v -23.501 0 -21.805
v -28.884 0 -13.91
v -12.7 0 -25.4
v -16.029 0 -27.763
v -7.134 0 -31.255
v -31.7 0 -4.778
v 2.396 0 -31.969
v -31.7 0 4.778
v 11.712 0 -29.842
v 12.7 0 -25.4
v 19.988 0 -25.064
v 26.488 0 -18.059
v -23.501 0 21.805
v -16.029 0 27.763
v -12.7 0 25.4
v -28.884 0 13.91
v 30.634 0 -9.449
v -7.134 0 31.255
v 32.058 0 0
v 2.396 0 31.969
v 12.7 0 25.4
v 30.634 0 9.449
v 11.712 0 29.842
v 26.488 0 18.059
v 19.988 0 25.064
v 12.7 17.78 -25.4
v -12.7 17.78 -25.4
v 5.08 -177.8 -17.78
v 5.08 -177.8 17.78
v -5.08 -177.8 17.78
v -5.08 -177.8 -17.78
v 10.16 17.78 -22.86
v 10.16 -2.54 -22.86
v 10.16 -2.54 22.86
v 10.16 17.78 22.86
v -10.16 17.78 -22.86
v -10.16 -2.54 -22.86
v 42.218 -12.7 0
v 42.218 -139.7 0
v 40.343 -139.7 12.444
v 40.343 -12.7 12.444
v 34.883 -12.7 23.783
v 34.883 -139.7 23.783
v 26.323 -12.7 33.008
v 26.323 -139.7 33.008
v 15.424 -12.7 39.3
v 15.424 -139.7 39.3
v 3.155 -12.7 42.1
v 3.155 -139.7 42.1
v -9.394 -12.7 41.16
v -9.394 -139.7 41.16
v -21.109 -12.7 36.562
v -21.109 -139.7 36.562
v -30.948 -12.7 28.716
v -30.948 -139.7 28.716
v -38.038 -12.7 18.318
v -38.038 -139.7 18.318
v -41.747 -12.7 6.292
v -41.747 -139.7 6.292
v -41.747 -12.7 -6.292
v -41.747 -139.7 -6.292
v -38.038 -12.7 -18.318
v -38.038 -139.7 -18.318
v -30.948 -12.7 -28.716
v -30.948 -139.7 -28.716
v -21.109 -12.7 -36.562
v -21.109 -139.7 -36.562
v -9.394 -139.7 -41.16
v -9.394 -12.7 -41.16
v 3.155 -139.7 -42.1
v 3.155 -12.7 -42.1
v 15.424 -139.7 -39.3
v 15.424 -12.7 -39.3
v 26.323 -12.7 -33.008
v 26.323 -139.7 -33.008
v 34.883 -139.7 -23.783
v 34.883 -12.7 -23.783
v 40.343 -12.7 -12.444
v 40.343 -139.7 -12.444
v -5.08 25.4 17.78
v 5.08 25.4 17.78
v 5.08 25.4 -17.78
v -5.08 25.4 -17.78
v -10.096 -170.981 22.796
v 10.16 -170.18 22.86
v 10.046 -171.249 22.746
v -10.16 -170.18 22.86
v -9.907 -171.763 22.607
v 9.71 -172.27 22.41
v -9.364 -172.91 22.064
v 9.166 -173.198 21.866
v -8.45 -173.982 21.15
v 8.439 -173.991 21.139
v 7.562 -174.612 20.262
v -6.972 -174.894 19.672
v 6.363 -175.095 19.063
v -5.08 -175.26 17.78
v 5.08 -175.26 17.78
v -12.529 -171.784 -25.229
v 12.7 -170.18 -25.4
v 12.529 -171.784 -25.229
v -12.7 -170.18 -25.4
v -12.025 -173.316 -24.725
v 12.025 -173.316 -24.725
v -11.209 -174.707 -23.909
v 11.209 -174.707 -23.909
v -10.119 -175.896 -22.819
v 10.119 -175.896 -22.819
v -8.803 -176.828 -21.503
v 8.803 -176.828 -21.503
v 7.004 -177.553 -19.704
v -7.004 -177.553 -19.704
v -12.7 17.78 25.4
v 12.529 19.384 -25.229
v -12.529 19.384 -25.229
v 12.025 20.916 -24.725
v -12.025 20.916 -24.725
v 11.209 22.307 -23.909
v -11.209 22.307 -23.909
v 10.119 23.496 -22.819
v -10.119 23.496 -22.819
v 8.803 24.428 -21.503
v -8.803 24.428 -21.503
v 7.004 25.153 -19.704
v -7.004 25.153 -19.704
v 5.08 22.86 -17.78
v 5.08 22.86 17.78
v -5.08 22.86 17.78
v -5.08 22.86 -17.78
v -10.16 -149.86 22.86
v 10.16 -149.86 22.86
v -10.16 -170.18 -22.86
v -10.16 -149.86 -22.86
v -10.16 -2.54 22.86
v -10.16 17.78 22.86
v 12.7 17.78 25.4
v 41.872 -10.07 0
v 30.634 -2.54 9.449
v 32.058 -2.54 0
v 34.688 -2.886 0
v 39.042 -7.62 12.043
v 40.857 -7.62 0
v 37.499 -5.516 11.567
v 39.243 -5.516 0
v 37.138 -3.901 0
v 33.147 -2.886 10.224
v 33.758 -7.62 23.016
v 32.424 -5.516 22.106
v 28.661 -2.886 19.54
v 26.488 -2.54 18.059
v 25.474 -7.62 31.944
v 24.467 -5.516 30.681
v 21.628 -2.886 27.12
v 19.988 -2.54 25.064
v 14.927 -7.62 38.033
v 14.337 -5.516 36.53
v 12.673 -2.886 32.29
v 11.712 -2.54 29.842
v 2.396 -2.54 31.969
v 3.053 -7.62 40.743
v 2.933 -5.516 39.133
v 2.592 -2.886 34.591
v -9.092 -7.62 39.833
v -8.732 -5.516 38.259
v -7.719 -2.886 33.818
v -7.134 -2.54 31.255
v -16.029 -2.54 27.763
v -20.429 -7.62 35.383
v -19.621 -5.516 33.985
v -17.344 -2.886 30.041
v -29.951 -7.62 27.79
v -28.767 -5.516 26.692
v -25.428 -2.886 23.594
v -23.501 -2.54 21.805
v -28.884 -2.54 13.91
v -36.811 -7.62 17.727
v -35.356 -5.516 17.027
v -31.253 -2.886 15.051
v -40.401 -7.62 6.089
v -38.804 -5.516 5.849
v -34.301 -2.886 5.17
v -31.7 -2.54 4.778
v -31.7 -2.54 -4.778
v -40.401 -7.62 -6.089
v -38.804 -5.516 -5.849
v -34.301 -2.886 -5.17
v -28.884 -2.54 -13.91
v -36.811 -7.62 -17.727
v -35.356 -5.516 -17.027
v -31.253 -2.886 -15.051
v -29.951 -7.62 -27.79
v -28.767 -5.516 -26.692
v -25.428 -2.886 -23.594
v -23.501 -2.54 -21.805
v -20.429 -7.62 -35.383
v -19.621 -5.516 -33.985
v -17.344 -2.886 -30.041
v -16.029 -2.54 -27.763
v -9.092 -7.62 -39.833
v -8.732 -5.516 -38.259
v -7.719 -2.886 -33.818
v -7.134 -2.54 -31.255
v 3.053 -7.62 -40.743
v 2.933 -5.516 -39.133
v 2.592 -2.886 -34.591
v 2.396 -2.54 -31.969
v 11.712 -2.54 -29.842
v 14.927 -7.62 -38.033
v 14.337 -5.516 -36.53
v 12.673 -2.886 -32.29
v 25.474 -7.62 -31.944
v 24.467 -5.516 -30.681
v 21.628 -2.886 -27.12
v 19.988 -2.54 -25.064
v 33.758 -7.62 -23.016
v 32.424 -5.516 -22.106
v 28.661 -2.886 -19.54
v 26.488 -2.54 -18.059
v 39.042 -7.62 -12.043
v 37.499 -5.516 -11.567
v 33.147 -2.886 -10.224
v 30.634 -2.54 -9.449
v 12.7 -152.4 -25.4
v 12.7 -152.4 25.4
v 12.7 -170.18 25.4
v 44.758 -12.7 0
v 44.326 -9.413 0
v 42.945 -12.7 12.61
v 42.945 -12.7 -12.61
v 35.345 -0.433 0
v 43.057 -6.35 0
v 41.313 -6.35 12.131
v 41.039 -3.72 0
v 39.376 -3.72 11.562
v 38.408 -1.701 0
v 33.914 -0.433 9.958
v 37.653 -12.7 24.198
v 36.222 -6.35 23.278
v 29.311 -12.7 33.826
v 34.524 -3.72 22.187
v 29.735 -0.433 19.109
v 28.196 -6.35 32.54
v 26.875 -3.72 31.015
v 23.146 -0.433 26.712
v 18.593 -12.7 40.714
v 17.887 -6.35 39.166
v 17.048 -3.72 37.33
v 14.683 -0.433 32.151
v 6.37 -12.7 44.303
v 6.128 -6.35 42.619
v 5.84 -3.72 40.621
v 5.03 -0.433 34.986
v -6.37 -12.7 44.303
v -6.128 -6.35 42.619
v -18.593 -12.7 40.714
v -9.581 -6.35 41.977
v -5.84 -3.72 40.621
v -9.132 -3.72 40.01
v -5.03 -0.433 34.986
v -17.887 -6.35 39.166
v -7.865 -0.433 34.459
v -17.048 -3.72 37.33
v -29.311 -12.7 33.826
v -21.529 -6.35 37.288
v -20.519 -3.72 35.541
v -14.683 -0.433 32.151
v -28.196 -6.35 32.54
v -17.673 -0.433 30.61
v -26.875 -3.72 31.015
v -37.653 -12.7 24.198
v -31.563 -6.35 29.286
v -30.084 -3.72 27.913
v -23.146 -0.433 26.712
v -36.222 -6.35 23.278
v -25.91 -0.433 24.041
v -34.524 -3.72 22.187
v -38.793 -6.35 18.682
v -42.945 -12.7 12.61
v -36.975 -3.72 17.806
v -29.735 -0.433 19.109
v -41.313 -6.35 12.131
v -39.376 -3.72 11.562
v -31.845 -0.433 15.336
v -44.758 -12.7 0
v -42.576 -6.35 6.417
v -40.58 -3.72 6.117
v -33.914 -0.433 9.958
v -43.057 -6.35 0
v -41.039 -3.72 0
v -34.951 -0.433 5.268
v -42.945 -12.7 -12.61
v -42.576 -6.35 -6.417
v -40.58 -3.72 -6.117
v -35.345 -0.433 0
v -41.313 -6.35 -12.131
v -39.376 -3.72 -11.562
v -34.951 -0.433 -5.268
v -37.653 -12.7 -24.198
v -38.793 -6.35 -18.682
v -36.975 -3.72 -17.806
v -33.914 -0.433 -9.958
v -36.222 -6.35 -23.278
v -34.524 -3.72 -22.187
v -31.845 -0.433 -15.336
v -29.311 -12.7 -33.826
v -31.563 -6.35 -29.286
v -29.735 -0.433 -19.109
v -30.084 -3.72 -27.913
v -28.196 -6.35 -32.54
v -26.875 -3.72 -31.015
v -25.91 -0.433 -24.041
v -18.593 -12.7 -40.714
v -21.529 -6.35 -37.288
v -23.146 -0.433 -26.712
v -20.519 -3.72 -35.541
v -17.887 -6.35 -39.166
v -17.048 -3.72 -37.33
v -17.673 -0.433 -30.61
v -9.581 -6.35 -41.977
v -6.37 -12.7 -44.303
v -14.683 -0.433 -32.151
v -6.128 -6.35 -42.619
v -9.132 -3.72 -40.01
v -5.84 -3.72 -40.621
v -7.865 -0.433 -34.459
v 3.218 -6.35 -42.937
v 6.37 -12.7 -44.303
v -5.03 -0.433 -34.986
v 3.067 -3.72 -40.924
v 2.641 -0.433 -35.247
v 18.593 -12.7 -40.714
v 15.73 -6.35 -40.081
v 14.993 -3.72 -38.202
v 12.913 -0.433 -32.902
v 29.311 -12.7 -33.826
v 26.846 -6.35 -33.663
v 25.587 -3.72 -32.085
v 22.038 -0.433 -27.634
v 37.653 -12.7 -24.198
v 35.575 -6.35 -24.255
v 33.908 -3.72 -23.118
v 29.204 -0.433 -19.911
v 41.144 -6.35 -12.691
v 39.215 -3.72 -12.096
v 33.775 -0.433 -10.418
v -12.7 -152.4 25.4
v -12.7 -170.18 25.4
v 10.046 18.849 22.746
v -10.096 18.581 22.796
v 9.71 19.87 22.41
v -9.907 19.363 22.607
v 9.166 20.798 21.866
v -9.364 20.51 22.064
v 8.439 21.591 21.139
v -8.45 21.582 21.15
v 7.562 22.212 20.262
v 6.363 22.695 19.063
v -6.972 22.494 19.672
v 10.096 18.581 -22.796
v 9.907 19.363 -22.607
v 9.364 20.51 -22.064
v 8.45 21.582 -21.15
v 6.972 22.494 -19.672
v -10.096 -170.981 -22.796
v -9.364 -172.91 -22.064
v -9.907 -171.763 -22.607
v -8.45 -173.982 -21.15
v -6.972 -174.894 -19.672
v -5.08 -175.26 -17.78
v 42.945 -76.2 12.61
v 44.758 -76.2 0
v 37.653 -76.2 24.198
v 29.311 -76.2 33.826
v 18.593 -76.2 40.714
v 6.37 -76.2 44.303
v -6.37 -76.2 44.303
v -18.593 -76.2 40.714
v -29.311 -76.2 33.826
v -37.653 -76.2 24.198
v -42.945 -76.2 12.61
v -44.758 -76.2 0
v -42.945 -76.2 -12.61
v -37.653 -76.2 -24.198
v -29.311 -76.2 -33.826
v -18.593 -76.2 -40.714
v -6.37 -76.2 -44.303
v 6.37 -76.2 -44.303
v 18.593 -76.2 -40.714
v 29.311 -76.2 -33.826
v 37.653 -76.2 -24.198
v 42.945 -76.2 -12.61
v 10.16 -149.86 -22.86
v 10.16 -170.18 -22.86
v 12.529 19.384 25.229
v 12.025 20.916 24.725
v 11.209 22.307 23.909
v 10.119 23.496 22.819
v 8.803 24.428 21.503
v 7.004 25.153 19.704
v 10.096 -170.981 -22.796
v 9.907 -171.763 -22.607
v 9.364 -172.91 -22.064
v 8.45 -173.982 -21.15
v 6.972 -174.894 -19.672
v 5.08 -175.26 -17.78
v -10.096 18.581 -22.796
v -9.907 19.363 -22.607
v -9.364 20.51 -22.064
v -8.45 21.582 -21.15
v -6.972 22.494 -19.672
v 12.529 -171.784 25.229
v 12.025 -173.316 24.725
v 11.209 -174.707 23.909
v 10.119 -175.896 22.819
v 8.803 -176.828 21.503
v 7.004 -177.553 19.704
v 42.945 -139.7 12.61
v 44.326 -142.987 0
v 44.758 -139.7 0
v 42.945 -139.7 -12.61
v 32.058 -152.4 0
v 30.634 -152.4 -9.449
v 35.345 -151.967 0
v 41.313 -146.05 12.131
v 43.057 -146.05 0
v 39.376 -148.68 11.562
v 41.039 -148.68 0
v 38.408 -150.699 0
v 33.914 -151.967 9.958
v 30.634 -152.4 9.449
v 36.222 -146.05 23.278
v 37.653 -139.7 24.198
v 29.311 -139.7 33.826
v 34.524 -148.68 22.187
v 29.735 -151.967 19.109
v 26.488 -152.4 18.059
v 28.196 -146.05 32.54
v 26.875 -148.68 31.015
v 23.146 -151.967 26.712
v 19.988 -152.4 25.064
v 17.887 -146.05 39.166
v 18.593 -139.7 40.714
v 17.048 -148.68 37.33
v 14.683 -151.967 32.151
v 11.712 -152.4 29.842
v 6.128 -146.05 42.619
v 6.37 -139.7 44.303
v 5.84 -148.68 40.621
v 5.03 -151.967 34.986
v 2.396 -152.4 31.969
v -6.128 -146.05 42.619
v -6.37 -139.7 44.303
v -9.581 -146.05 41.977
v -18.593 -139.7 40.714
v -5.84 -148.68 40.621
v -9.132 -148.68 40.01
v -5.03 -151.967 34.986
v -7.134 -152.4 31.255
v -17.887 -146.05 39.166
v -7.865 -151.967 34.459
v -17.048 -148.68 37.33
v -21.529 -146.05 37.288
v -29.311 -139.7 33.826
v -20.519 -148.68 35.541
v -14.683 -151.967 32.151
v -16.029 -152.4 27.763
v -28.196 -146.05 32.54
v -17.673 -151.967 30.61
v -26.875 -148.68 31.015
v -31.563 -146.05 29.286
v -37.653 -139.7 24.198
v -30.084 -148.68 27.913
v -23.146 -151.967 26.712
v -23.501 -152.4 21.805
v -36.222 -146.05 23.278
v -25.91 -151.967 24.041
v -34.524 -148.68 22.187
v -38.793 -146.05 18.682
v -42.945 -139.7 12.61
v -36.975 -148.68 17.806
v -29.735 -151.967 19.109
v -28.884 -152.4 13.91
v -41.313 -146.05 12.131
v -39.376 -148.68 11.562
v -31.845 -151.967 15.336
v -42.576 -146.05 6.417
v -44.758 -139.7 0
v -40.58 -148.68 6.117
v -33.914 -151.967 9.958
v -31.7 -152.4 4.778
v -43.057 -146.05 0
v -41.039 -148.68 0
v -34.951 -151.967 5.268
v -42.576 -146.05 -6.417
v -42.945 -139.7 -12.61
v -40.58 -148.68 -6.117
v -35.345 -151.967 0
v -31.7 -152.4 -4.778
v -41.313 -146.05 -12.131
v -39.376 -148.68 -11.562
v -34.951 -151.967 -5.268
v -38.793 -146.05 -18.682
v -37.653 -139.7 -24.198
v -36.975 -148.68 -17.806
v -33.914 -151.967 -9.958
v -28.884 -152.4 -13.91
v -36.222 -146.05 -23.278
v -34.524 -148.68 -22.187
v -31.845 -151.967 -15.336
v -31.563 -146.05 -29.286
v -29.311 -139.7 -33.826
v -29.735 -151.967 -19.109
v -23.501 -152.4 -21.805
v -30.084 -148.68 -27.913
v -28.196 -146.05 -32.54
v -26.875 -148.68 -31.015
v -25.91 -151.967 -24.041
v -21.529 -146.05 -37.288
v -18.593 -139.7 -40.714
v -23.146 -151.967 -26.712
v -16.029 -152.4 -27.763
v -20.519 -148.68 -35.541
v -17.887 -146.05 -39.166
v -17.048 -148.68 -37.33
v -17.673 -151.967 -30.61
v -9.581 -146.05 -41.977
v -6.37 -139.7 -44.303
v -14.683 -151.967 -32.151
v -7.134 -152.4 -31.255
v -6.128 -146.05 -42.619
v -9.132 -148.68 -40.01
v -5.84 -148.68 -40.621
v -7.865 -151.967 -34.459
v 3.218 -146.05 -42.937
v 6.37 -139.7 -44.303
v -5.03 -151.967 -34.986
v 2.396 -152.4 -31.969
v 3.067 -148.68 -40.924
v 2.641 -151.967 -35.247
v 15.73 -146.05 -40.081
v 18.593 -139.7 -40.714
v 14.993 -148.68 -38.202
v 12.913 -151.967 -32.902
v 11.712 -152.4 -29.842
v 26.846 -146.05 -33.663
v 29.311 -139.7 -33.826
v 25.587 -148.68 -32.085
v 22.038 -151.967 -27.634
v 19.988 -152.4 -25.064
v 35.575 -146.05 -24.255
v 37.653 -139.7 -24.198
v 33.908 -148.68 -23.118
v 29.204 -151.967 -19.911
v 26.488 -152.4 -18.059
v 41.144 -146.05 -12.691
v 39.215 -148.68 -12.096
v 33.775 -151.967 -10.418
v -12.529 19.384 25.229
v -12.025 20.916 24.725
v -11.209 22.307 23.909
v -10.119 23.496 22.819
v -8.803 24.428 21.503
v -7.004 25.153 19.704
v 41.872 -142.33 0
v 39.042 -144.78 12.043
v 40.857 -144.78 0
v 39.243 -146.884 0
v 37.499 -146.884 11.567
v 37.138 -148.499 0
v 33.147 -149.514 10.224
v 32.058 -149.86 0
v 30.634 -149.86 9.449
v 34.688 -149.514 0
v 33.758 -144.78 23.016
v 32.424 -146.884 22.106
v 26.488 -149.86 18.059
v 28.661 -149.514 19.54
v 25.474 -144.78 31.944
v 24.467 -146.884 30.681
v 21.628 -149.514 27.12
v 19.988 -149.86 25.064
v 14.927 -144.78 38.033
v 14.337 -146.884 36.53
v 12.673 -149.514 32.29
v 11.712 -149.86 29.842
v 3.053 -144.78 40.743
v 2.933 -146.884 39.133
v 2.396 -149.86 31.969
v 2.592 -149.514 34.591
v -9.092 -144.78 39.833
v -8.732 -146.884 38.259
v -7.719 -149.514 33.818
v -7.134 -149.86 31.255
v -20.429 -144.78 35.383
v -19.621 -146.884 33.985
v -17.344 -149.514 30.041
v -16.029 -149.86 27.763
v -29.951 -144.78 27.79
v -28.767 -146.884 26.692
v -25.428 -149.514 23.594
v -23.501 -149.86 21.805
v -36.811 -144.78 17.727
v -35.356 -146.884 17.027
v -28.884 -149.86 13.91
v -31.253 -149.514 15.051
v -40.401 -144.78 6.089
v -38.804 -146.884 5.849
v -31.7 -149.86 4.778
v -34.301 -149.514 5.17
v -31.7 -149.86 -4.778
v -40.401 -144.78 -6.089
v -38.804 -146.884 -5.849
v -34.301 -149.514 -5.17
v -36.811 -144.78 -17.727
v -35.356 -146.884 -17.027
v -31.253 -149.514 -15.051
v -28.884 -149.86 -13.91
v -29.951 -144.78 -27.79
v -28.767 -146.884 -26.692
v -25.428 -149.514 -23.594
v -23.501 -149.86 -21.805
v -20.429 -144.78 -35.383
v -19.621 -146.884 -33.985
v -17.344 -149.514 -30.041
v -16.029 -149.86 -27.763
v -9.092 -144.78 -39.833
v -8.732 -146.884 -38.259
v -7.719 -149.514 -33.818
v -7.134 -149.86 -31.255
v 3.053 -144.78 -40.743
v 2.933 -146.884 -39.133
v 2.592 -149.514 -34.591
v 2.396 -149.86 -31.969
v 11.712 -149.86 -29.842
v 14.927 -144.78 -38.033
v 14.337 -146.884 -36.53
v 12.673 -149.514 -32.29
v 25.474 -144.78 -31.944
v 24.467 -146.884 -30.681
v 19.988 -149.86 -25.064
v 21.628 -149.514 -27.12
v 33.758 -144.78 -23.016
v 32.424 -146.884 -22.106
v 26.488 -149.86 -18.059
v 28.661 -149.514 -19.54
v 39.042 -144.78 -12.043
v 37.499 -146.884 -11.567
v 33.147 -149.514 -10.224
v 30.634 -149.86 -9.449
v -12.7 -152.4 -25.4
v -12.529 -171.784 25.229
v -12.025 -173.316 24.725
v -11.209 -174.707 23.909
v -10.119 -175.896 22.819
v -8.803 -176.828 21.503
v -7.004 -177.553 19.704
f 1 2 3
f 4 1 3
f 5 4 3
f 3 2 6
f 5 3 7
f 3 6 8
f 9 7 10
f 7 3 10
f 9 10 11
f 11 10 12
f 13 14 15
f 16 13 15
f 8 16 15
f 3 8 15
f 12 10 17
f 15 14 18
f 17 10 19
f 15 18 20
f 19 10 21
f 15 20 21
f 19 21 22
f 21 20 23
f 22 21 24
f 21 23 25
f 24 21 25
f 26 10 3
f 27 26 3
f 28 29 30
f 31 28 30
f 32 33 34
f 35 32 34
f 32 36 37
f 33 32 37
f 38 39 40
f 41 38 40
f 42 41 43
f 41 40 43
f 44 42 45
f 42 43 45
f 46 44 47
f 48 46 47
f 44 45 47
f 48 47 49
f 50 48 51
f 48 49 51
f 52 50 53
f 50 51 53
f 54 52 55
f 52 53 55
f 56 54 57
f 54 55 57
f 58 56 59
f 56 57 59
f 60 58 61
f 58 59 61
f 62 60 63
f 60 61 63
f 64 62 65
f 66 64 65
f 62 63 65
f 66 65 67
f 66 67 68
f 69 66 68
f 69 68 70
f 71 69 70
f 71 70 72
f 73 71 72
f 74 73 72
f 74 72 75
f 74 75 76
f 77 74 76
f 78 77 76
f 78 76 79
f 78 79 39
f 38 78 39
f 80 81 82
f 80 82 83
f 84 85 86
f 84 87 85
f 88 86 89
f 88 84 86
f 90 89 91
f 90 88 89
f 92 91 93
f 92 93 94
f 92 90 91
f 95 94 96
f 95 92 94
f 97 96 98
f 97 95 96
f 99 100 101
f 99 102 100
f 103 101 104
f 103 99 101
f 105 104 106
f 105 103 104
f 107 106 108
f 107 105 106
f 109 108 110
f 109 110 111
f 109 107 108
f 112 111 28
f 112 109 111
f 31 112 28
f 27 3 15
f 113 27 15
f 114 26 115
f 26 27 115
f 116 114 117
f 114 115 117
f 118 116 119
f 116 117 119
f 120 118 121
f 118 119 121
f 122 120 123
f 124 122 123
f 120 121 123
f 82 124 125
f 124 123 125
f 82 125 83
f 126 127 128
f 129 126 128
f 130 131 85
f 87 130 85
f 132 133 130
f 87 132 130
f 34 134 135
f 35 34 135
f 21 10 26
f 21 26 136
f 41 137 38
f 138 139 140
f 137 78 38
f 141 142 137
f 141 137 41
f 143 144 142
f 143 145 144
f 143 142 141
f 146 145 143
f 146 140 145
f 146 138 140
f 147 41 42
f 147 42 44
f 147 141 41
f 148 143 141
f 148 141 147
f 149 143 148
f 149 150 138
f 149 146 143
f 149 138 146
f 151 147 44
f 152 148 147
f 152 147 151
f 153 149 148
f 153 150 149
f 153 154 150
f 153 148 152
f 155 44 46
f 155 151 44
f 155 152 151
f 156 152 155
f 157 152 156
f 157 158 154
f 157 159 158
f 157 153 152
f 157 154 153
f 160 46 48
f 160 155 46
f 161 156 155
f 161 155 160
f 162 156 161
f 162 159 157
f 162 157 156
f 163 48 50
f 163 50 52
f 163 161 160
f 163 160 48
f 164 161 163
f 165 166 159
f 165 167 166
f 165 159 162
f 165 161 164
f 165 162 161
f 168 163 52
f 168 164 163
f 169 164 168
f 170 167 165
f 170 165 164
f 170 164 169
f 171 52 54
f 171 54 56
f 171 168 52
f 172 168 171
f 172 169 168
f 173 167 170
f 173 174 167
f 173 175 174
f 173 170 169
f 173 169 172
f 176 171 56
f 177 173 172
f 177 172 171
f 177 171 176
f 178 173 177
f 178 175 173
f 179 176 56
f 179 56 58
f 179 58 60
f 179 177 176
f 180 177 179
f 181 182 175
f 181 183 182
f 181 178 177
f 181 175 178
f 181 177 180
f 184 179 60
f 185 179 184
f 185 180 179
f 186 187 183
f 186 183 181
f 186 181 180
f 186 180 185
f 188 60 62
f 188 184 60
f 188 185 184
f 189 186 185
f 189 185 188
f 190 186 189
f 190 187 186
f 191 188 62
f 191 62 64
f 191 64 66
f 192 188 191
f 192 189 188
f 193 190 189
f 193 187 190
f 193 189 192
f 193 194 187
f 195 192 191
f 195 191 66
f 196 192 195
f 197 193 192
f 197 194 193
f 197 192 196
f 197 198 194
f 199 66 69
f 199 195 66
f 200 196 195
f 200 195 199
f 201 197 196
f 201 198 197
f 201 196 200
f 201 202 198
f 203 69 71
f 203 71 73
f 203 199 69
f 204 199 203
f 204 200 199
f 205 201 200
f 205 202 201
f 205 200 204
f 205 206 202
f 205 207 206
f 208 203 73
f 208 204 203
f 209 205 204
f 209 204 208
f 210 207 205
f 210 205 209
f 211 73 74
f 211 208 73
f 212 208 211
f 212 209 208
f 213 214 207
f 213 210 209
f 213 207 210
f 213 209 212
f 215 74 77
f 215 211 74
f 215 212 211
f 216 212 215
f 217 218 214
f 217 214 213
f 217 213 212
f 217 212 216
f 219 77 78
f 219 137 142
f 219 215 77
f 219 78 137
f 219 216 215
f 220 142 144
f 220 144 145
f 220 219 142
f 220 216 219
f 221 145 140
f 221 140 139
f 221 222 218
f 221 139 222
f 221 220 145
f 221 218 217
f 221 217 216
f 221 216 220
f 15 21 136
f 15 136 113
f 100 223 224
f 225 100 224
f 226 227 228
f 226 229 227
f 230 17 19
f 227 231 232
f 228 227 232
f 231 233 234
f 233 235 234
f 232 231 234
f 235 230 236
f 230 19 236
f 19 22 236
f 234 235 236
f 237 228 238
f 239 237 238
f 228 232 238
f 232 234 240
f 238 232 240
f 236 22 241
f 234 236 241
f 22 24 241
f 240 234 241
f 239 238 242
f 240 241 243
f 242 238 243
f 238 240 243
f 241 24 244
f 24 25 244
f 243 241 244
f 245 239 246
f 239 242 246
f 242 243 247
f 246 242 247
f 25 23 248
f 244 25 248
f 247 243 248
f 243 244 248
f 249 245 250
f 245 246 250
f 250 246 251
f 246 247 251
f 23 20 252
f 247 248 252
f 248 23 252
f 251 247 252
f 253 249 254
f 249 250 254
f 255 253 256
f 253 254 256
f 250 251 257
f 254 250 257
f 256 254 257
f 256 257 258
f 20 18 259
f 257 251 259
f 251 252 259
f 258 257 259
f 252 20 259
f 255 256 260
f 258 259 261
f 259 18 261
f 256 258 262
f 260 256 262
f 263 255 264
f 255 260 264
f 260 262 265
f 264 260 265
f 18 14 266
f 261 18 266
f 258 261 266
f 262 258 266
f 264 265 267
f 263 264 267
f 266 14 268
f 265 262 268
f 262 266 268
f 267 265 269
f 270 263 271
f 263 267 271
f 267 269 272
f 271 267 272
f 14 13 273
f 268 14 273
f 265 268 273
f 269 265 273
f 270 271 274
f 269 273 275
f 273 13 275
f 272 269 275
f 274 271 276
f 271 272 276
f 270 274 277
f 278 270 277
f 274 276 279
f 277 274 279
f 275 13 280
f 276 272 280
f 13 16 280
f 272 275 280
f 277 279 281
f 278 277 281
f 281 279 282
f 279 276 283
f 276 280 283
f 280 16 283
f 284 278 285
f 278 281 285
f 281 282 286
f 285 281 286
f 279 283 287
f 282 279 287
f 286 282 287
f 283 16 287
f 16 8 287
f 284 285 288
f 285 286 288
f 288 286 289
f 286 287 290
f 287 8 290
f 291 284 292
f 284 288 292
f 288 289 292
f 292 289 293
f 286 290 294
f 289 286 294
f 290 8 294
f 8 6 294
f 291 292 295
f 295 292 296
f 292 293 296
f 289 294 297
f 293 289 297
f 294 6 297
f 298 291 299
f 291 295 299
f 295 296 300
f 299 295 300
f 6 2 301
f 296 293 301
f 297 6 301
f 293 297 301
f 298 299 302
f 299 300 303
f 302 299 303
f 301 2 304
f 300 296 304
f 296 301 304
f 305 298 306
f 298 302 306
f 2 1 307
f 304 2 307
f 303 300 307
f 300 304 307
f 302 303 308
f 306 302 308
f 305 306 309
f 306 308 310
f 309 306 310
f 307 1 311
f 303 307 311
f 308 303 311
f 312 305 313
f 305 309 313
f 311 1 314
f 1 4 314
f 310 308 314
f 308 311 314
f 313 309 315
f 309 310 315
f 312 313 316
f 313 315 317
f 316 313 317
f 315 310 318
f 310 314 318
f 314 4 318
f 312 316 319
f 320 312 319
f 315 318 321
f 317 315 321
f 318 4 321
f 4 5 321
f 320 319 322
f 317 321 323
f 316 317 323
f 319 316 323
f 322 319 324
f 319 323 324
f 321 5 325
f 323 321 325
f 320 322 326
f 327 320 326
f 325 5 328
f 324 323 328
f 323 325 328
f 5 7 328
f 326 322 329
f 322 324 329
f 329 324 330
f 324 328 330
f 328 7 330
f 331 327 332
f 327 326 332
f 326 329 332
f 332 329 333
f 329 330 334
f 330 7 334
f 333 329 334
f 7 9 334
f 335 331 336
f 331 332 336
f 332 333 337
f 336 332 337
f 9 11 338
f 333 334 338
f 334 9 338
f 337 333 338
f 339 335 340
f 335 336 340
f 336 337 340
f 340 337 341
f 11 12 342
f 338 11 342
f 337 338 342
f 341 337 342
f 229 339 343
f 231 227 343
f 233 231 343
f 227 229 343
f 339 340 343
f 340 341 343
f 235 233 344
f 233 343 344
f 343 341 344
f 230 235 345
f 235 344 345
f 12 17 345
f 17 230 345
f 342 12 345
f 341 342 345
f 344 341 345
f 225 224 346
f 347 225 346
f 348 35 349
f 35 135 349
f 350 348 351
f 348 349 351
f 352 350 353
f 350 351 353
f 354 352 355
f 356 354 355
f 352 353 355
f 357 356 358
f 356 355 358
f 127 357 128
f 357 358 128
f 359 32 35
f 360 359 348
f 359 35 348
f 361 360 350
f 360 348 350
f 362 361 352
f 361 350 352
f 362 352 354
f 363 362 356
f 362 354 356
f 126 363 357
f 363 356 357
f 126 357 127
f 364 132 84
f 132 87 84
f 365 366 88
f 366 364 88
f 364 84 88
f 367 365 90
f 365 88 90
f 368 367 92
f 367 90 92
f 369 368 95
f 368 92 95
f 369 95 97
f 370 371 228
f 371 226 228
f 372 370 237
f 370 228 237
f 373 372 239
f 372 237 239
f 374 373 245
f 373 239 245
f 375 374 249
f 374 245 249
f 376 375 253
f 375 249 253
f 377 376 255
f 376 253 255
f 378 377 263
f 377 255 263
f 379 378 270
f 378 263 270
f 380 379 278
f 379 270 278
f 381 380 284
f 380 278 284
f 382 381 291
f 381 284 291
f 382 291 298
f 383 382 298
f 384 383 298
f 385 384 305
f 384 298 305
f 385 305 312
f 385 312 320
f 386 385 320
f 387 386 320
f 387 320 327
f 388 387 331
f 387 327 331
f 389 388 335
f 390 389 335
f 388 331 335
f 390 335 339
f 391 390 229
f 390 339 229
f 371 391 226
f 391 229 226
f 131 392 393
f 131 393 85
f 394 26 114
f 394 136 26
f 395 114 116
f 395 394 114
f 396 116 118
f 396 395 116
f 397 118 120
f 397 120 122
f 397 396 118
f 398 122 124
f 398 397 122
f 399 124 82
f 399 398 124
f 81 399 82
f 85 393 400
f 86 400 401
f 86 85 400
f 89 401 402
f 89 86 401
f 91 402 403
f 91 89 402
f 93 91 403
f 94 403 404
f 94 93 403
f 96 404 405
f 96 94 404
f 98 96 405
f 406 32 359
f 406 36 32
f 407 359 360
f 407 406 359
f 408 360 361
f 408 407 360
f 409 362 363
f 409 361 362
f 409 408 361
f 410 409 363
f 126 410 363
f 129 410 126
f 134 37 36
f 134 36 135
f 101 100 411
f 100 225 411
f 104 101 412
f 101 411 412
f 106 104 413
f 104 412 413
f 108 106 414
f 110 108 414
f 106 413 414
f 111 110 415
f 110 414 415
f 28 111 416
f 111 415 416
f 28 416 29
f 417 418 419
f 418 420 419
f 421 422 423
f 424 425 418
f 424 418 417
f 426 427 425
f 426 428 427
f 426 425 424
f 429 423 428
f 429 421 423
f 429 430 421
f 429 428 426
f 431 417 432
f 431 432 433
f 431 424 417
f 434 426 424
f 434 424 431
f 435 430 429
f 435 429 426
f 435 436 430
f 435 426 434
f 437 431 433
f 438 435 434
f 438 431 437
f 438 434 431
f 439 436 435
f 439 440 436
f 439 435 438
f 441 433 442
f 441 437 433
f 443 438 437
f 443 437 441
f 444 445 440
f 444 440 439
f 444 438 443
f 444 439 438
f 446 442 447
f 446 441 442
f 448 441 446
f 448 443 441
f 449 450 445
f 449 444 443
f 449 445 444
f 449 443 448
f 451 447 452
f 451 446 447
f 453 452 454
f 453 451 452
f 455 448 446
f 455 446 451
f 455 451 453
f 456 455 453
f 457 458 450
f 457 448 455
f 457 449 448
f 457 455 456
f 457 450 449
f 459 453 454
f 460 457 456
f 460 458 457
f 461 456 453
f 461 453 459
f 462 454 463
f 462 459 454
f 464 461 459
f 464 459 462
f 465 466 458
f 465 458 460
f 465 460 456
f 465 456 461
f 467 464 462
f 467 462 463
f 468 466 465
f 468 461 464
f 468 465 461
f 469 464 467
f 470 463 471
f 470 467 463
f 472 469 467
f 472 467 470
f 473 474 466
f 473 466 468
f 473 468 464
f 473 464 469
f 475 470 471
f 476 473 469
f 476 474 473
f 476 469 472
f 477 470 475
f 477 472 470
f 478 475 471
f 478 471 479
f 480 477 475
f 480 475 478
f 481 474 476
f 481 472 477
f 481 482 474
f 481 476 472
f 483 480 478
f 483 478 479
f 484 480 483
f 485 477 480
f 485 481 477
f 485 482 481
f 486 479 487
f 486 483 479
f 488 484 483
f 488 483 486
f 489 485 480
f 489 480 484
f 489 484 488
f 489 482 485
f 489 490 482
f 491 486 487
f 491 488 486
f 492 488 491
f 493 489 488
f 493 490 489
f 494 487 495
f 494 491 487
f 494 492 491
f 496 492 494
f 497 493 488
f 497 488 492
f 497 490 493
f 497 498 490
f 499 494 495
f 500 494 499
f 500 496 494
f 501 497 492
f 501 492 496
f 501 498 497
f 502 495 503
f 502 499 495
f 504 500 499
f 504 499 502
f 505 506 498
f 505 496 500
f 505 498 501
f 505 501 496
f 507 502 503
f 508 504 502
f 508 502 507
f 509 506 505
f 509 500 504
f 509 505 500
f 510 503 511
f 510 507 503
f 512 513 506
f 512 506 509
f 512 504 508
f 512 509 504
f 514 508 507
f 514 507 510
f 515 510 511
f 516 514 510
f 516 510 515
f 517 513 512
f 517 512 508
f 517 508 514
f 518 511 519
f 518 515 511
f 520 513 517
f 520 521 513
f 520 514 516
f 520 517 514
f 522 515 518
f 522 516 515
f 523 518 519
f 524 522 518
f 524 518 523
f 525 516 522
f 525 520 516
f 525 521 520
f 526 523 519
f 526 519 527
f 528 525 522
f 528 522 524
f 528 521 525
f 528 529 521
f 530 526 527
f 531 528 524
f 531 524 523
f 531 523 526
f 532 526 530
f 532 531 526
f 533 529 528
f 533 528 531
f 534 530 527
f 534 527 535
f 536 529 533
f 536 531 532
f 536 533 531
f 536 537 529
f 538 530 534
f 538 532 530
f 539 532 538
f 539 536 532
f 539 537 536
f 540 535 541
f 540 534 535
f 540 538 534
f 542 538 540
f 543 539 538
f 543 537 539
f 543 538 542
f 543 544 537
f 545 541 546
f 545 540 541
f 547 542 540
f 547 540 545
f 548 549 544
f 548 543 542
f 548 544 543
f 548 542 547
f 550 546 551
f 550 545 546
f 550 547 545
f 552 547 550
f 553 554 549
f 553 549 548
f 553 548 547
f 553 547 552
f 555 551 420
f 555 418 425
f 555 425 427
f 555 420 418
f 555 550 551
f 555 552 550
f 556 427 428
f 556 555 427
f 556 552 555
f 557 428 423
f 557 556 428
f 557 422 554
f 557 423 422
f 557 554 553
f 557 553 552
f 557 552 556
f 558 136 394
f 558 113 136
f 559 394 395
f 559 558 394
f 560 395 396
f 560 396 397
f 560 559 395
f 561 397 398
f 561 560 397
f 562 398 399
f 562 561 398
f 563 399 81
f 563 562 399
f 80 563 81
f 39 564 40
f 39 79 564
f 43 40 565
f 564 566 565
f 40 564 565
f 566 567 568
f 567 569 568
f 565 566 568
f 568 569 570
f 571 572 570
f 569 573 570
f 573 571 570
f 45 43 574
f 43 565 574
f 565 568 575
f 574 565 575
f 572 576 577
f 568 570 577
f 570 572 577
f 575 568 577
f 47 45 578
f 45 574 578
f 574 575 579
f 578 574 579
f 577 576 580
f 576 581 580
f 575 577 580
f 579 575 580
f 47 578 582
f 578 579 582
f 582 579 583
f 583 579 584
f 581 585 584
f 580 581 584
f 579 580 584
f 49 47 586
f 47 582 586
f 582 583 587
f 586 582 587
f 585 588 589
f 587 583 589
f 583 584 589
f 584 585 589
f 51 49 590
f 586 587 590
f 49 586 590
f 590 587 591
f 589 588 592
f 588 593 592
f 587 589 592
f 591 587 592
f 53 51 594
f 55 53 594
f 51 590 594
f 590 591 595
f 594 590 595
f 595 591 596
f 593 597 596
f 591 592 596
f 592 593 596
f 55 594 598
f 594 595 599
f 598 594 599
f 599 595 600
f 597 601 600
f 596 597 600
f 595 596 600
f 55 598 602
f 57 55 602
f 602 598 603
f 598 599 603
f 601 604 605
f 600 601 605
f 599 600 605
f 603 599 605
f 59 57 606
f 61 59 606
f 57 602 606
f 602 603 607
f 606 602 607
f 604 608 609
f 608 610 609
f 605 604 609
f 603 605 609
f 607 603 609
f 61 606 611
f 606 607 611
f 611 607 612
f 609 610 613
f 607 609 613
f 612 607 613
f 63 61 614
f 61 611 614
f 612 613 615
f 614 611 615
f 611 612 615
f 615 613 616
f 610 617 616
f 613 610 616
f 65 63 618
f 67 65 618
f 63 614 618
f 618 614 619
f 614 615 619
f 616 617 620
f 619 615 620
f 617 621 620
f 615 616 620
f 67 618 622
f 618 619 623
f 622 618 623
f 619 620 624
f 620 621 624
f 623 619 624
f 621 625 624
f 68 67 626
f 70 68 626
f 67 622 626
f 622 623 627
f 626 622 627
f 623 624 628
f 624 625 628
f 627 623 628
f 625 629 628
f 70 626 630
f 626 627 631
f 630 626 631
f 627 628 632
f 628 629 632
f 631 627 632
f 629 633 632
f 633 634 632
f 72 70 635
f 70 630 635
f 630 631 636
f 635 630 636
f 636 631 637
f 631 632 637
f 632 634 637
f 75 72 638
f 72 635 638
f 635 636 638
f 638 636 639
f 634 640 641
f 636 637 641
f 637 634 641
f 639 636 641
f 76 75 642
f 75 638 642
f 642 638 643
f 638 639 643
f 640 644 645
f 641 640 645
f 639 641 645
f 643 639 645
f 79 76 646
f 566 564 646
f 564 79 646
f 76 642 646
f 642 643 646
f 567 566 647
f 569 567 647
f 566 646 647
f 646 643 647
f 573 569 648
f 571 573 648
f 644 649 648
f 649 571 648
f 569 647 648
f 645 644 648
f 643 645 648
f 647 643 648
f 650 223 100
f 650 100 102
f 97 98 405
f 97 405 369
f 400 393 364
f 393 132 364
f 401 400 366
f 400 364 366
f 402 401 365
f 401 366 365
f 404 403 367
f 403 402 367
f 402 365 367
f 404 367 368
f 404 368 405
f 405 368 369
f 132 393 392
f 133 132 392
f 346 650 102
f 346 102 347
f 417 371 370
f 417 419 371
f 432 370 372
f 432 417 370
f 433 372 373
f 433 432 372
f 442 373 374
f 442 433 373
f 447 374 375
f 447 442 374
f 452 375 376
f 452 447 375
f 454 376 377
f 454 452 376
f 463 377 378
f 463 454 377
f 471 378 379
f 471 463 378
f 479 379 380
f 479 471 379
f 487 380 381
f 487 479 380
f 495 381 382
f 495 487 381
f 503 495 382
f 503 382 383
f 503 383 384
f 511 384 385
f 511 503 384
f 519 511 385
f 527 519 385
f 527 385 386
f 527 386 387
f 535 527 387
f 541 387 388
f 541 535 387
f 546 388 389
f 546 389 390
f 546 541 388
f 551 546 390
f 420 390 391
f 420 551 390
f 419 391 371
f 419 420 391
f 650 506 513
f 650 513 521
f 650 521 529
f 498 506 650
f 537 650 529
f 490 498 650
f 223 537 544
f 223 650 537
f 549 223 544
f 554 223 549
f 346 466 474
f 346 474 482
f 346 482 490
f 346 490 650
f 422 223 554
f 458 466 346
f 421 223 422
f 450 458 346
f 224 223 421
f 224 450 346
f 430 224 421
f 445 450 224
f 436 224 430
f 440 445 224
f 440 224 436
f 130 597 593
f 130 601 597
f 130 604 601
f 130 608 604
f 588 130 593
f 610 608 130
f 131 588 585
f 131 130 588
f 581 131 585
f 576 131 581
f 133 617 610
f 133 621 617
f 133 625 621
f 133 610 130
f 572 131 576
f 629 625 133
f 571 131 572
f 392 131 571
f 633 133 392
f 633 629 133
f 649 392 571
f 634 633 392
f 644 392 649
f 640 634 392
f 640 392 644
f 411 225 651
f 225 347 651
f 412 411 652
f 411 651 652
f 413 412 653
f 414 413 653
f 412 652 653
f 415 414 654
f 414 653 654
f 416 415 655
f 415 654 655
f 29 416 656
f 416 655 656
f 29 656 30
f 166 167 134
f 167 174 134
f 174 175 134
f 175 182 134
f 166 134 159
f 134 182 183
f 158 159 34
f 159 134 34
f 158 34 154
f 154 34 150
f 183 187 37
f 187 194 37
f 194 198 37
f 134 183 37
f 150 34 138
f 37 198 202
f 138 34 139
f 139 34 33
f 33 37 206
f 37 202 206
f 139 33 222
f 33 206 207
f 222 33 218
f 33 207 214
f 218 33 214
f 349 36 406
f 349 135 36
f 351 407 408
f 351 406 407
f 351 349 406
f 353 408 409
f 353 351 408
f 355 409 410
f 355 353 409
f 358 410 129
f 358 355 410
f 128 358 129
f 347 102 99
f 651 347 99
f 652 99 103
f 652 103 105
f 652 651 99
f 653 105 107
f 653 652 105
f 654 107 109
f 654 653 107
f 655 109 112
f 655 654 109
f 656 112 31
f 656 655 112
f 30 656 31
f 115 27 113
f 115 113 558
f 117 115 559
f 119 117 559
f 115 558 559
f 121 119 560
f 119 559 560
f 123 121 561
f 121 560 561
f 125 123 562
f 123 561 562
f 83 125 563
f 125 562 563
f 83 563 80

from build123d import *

# Parameters (mm, degrees)
F0_R        = 44.7584797017
F1_DEPTH    = 76.2
F2_DEPTH    = 25.4
F4_R        = 12.7
F3_W        = 25.4
F3_H        = 50.8
F5_DEPTH    = 25.4
F6_R        = 7.62
F7_T        = 2.54
F7_T3_DEPTH = 30.48
F7_T5_DEPTH = 55.88


# Not quite as in the source:
# - a shell that OpenCascade refuses in one call is made with other operations: the cavity is built on its own and cut out


with BuildPart() as f1:
    # F0 (on Front) → F1 (new body)
    with BuildSketch(Plane.XZ):
        Circle(F0_R)
    extrude(amount=F1_DEPTH)

    # F0 (on Front) → F2 (join)
    with BuildSketch(Plane.XZ):
        Circle(F0_R)
    extrude(amount=F2_DEPTH)

    # F4
    f4_edges = [f1.edges().sort_by_distance(p)[0] for p in [
        (-44.75848, 0, 0),
    ]]
    fillet(f4_edges, radius=F4_R)

    # F3 (on face) → F5 (join)
    with BuildSketch(Plane(origin=(0, 0, 0), x_dir=(-1, 0, 0), z_dir=(0, 1, 0))):
        Rectangle(F3_W, F3_H)
    extrude(amount=F5_DEPTH)

    # F6
    f6_edges = [f1.edges().sort_by_distance(p)[0] for p in [
        (-12.7, 25.4, 0),
        (0, 25.4, 25.4),
        (12.7, 25.4, 0),
        (0, 25.4, -25.4),
    ]]
    fillet(f6_edges, radius=F6_R)

    # F7: shell of thickness 2.54, made by hand


with BuildPart() as f7_core1:
    # F7_t2: copy of F1
    add(f1.part)

    # the walls: a layer under each face that stays
    f7_faces = [f7_core1.faces().sort_by_distance(p)[0] for p in [
        (0, 8.89, -25.4),
        (12.7, 8.89, 0),
        (0, 23.1681536726, -23.1681536726),
        (-21.3723198011, 0, -21.3723198011),
        (-12.7, 8.89, 0),
        (0, 8.89, 25.4),
        (10.4681536726, 23.1681536726, 0),
        (0, 25.4, 0),
        (-10.4681536726, 23.1681536726, 0),
        (-41.0387358228, -3.7197438789, 0),
        (0, 23.1681536726, 23.1681536726),
        (-44.7584797017, -44.45, 0),
    ]]
    thicken(f7_faces, amount=-F7_T, mode=Mode.SUBTRACT)

    # F7_s4 → F7_t3 (cut)
    with BuildSketch(Plane.YZ.offset(-15.24)):
        Polygon((0.0254, -25.4254), (0, -22.86), (-2.54, -22.86), (-2.54, -25.4), align=None)
        Polygon((0.0254, 25.4254), (-2.54, 25.4), (-2.54, 22.86), (0, 22.86), align=None)
    extrude(amount=F7_T3_DEPTH, mode=Mode.SUBTRACT)

    # F7_s6 → F7_t5 (cut)
    with BuildSketch(Plane.XY.offset(-27.94)):
        Polygon((12.7254, 0.0254), (10.16, 0), (10.16, -2.54), (12.7, -2.54), align=None)
        Polygon((-12.7254, 0.0254), (-12.7, -2.54), (-10.16, -2.54), (-10.16, 0), align=None)
    extrude(amount=F7_T5_DEPTH, mode=Mode.SUBTRACT)


with BuildPart() as f1_1:
    add(f1.part)

    # what is left inside the walls is the cavity
    f7_cavity = [f7_core1.part.solids().sort_by_distance(p)[0] for p in [
        (-42.19308, -55.033333, 0),
    ]]
    add(f7_cavity, mode=Mode.SUBTRACT)

    # F8: F1 across face


with BuildPart() as f1_2:
    add(f1_1.part)
    add(f1_1.part.mirror(Plane.XZ.offset(76.2)))


solid = f1_2.part
